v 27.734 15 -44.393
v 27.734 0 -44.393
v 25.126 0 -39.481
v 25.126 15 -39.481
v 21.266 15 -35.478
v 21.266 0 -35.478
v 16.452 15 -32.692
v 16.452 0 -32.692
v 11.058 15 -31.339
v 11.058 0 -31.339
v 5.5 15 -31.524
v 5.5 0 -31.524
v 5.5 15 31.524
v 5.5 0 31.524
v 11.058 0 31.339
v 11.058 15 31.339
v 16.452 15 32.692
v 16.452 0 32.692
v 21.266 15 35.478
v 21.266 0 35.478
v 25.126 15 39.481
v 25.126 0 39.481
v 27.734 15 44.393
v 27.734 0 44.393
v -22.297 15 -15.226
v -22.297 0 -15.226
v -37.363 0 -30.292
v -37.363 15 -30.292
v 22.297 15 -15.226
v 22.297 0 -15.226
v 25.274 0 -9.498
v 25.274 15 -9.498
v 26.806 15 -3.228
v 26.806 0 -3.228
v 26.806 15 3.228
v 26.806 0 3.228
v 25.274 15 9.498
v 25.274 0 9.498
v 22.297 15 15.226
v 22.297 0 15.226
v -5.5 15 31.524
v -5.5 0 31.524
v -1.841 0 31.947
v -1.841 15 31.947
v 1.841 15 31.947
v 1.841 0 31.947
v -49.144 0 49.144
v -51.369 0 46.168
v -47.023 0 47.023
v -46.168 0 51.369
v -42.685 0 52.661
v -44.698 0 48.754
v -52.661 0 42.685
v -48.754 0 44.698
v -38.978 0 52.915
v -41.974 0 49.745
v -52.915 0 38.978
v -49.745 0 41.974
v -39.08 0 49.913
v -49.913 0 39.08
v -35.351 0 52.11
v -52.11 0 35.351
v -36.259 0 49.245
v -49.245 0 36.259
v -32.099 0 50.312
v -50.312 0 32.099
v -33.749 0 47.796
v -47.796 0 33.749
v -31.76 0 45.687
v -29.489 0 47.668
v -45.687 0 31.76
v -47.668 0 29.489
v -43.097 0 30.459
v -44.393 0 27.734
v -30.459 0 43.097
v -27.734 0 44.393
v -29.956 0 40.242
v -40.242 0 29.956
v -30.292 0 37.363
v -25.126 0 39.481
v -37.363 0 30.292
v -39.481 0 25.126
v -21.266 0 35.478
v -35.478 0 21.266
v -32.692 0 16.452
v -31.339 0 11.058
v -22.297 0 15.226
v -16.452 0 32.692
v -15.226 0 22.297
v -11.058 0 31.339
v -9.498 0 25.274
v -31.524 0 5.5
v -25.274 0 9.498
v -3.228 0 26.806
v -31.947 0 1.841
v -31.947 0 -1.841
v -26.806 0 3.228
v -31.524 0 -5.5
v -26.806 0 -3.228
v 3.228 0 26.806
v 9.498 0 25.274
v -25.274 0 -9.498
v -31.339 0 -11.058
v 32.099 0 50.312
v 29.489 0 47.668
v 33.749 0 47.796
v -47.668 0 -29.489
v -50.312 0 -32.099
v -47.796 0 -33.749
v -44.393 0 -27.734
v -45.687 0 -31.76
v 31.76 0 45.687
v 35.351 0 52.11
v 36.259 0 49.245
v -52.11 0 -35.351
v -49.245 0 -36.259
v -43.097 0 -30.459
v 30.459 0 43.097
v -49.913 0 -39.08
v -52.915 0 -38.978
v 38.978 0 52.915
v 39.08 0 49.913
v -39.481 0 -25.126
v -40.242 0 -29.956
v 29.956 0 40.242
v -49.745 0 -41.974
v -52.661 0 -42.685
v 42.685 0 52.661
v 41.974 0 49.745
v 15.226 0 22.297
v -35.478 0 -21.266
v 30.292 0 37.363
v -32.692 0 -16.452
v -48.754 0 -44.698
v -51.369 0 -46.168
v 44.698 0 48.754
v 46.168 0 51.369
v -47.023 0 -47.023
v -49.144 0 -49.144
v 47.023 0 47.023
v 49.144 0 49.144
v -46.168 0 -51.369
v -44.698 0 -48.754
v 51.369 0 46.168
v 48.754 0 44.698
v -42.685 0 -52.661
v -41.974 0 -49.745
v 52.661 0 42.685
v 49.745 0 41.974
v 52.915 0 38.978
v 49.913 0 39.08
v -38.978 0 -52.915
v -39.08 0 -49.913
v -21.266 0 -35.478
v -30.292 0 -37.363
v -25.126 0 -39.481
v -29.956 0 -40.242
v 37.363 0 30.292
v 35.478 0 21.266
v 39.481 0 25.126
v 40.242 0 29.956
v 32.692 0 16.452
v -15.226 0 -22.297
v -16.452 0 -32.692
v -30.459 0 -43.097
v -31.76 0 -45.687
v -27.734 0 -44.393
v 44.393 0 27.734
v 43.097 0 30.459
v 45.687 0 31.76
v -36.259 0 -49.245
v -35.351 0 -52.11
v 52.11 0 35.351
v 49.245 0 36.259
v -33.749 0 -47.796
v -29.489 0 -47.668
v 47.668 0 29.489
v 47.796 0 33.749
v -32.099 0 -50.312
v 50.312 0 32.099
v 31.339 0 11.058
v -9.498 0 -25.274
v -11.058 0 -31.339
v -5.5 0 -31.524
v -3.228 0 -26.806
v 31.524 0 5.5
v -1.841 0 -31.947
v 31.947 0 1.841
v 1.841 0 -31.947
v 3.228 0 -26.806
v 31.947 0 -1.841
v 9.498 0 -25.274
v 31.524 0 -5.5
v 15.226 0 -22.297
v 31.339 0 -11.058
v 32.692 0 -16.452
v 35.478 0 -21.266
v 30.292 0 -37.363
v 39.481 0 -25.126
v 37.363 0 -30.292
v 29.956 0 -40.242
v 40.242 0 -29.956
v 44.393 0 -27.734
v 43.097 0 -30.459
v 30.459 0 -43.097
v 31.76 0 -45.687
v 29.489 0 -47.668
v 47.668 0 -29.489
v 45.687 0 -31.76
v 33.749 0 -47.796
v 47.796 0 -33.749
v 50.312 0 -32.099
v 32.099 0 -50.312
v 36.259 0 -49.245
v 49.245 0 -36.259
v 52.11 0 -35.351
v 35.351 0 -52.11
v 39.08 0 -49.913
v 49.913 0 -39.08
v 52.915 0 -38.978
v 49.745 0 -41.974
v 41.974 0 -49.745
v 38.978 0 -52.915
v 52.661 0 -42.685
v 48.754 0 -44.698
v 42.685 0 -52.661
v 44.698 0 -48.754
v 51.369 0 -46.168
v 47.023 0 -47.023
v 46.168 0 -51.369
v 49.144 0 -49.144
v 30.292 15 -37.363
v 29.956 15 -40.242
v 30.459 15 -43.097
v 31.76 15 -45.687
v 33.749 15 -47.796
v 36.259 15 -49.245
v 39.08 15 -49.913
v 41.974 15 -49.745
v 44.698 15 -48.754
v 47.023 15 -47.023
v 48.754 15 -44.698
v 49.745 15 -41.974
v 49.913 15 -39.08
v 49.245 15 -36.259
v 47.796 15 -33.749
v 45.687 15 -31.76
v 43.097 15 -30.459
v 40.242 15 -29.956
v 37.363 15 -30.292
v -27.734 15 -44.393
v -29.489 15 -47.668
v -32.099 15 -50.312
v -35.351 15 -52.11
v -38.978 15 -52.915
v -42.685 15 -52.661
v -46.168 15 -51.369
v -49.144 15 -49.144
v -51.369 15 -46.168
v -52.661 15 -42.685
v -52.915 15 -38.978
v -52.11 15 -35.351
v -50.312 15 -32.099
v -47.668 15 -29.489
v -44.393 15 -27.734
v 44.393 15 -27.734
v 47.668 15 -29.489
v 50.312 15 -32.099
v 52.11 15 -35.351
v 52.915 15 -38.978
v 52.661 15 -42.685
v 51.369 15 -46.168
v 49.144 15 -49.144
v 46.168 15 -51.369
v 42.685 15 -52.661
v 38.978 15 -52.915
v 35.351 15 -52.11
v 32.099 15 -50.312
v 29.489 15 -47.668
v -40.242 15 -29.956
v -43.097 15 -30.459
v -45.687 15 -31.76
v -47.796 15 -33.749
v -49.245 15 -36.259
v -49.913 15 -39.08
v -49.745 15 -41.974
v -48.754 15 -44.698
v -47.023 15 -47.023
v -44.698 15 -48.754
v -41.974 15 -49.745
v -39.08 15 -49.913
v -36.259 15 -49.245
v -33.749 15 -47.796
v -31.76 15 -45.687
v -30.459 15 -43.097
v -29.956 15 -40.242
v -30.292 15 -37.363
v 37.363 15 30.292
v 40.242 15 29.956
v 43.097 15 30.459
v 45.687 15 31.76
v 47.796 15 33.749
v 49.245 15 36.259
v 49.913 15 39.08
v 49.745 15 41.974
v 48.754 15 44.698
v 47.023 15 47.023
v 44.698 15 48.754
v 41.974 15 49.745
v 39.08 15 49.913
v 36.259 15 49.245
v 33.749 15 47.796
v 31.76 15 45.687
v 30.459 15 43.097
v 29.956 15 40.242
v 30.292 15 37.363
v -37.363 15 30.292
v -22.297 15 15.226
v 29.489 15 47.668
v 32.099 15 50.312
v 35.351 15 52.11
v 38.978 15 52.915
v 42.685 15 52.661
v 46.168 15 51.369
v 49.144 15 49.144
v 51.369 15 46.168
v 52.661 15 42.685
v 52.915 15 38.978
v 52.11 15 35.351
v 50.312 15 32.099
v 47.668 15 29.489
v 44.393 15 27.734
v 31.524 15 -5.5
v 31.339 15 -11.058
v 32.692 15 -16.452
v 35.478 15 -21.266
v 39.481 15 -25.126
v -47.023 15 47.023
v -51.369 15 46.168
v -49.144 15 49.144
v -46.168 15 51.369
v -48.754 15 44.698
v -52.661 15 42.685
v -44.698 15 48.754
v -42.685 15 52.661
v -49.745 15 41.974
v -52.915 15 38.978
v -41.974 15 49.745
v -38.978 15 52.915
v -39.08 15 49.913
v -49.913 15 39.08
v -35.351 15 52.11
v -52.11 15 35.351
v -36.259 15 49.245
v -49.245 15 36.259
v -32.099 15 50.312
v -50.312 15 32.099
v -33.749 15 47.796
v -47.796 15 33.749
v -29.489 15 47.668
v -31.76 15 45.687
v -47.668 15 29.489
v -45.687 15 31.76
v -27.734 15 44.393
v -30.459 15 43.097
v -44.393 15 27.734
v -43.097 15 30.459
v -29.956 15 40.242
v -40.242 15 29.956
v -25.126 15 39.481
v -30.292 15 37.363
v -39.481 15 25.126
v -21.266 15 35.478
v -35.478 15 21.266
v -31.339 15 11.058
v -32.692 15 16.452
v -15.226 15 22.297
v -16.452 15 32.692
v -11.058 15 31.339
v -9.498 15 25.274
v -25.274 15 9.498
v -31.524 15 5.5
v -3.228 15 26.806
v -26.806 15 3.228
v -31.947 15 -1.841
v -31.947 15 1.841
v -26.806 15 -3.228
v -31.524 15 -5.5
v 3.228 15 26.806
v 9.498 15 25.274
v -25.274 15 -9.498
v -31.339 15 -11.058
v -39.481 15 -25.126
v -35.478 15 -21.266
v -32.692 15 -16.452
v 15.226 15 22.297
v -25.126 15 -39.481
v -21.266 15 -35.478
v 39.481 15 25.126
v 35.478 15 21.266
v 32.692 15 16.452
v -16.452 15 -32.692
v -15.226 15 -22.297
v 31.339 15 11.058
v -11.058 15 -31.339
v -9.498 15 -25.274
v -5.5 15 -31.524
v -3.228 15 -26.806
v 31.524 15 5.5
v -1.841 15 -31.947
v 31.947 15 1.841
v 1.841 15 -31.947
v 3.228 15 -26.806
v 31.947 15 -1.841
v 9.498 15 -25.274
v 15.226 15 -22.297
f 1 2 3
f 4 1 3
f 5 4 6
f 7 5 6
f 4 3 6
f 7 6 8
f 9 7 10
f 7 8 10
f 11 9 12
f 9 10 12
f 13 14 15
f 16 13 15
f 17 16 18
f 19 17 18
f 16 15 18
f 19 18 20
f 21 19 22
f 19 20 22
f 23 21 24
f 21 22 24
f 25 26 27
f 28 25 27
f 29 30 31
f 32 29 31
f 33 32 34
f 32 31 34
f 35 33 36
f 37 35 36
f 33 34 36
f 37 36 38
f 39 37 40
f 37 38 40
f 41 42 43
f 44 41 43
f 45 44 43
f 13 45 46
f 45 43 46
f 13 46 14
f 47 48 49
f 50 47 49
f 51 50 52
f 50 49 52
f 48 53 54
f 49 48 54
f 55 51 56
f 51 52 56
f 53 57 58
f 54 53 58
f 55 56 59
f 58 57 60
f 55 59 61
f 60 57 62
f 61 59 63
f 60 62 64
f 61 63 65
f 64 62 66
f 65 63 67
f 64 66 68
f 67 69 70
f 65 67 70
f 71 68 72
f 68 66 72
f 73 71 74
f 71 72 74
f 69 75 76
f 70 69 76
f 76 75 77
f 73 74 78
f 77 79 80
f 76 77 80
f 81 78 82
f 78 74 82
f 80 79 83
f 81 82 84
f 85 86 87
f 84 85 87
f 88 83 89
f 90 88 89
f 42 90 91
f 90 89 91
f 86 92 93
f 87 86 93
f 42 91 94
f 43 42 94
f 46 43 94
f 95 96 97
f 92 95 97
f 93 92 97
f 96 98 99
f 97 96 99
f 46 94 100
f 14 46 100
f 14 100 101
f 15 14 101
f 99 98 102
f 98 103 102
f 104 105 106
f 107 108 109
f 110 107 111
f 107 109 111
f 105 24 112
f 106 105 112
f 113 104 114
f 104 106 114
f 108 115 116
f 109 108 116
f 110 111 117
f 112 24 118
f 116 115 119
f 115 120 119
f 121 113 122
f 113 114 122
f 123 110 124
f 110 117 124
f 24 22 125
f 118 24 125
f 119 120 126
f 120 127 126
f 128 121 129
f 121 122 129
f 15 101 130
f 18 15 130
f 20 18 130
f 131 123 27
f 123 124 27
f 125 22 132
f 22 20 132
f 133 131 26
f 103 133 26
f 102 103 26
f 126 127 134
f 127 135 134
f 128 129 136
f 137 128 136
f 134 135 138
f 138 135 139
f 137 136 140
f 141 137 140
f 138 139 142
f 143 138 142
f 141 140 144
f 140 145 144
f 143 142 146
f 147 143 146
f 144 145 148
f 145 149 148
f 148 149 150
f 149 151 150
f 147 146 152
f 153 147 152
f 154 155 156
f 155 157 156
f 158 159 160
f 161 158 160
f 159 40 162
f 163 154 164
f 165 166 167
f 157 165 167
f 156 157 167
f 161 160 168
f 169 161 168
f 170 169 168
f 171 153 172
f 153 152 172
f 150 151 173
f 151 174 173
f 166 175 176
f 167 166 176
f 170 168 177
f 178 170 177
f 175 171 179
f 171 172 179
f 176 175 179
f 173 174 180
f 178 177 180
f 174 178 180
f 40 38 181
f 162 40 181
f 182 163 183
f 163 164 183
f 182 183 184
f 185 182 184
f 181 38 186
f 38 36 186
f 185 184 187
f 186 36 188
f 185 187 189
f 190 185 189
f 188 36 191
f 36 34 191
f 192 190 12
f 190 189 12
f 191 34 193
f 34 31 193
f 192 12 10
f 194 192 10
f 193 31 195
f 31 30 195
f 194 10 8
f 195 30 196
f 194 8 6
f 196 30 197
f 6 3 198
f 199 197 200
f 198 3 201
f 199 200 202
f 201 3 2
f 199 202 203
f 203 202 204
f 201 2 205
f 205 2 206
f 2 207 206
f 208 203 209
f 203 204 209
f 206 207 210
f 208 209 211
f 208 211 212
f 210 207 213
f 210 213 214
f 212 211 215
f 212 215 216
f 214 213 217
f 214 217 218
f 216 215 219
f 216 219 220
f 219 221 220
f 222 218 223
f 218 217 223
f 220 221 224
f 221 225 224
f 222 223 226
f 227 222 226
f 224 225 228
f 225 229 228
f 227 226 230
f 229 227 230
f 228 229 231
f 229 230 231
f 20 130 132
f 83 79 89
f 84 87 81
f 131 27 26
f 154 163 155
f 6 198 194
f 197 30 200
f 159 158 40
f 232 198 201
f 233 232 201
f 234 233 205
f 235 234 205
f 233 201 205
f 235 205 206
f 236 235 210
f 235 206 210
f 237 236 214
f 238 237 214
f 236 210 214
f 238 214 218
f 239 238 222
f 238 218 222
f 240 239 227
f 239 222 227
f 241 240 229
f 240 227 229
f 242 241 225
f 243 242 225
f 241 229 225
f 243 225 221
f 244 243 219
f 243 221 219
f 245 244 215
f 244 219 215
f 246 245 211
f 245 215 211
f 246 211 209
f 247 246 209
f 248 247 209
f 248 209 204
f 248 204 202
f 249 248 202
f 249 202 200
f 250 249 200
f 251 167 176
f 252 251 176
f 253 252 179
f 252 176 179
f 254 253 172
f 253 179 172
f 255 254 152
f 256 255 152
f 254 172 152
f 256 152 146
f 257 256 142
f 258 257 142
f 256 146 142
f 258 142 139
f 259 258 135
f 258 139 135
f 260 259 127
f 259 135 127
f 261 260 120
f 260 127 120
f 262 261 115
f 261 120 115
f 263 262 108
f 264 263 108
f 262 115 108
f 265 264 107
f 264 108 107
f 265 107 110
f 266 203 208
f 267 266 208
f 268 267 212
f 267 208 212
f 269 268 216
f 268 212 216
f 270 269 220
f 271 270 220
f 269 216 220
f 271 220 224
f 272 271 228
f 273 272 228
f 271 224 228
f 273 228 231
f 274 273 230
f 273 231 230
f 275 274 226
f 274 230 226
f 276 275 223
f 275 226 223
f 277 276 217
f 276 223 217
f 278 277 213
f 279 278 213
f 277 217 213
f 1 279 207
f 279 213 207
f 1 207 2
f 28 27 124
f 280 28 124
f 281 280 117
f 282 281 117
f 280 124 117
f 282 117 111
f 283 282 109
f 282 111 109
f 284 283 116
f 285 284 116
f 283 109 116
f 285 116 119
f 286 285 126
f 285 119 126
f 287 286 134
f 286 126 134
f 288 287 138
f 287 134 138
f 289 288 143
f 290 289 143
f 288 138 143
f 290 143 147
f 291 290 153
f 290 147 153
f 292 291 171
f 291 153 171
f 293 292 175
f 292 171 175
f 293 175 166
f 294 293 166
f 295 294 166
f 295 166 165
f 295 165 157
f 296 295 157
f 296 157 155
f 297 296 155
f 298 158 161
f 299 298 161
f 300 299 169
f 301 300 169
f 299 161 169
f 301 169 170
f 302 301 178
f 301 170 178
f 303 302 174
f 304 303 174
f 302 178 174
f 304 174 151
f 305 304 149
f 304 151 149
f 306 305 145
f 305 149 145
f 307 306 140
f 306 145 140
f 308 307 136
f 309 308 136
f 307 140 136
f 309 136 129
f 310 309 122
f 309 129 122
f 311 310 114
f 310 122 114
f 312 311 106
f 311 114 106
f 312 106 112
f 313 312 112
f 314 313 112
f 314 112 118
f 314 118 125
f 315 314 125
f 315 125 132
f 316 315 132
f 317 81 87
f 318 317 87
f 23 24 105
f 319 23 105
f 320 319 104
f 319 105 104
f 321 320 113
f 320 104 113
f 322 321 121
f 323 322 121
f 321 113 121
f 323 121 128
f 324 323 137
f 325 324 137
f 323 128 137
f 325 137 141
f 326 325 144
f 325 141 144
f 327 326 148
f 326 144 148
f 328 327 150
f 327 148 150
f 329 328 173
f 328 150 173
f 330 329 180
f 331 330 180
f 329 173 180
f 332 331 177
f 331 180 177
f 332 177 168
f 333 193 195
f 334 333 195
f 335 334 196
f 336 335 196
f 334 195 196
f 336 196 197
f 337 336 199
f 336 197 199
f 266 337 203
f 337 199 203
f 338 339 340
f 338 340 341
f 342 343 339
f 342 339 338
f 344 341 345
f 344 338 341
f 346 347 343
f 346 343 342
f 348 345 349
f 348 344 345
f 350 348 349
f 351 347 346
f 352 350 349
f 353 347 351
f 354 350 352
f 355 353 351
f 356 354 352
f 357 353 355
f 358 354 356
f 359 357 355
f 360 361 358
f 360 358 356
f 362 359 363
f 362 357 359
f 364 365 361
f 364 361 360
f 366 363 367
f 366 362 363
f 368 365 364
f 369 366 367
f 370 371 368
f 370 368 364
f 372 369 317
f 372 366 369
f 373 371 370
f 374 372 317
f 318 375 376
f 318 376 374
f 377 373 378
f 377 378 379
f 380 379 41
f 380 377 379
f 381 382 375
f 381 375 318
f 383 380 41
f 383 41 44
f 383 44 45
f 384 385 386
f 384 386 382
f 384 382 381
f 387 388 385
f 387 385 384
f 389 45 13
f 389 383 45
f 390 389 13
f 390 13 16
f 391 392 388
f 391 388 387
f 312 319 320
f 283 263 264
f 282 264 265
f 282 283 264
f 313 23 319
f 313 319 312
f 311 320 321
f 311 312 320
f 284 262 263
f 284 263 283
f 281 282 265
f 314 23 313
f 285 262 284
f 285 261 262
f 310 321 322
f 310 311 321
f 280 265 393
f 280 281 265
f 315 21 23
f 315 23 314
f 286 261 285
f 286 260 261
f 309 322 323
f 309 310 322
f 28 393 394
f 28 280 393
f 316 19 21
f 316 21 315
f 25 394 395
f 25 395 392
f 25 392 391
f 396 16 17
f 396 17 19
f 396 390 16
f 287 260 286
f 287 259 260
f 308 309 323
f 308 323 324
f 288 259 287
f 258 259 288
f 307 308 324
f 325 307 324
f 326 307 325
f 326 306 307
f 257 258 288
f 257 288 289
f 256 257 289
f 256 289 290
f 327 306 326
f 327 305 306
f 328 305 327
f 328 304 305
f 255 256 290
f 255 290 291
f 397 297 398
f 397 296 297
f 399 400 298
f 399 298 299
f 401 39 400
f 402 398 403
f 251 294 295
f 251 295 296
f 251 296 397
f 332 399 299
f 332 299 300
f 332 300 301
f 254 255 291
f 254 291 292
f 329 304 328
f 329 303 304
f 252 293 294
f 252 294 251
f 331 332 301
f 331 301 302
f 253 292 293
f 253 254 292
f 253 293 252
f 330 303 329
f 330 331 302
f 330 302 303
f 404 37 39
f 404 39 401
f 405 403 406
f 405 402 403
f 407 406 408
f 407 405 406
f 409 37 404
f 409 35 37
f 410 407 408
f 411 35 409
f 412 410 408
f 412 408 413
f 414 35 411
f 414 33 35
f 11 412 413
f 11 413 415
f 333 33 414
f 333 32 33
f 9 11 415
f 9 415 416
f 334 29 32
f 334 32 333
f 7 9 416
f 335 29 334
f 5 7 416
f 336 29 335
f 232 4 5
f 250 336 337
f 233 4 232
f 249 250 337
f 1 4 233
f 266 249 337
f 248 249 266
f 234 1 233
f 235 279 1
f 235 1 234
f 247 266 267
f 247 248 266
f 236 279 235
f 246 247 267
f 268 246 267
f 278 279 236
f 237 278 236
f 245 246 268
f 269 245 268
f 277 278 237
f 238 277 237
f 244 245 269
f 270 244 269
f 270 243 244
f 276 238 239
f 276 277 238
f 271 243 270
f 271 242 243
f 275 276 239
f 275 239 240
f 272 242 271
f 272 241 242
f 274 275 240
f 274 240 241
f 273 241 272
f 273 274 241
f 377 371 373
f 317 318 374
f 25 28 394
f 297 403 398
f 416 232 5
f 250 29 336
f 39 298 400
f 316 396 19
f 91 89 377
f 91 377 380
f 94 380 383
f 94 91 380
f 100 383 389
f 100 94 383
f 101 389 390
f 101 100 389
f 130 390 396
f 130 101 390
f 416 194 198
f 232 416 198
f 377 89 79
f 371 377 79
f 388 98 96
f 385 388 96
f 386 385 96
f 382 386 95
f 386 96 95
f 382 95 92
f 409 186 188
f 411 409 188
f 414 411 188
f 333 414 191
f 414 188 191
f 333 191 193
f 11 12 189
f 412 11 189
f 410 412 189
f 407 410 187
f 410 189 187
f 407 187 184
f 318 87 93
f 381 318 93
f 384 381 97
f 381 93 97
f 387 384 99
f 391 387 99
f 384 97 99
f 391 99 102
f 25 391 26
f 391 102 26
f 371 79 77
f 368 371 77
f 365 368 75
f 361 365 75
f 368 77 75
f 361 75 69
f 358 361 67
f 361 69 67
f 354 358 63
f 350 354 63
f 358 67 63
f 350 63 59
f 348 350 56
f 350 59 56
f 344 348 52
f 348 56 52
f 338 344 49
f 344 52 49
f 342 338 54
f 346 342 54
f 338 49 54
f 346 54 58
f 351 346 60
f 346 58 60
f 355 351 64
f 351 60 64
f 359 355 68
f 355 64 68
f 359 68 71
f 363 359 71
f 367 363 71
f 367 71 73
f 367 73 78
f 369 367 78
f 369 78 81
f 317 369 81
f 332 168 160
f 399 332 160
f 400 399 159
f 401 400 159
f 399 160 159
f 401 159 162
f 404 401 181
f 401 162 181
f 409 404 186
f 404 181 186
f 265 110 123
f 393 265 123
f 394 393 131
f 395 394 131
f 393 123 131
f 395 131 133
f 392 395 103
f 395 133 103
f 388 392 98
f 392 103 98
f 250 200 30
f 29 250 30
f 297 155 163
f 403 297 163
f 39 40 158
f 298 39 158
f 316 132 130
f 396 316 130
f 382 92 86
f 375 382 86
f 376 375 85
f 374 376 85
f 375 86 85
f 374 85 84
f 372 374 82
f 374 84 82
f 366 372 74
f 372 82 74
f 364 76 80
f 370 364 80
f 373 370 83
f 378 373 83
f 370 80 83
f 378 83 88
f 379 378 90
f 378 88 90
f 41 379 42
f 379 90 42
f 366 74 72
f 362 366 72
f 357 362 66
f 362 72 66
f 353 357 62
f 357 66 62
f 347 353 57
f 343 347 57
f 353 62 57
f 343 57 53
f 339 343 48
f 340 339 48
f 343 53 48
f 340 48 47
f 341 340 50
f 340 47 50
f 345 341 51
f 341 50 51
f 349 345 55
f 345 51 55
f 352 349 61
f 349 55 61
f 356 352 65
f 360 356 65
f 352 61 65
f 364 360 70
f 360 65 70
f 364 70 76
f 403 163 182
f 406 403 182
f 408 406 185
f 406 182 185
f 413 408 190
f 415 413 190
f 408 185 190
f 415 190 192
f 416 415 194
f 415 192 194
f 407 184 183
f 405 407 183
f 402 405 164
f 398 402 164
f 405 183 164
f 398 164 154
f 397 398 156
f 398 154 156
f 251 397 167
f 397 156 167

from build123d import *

# Parameters (mm, degrees)
SKETCH1_R           = 27
BOSS_EXTRUDE1_DEPTH = 15
CUT_EXTRUDE1_START  = -15
CUT_EXTRUDE1_DEPTH  = 15


with BuildPart() as part:
    # Sketch1 → Boss-Extrude1 (new body)
    with BuildSketch(Plane(origin=(0, 0, 0), x_dir=(1, 0, 0), z_dir=(0, 1, 0))):
        with BuildLine():
            ThreePointArc((-31.523820357, 5.499886369), (-32, 0), (-31.523820357, -5.499886369))
            ThreePointArc((-31.523820357, -5.499886369), (-33.916662735, -18.956279365), (-44.393071751, -27.733810979))
            ThreePointArc((-44.393071751, -27.733810979), (-49.143921292, -49.143921292), (-27.733810979, -44.393071751))
            ThreePointArc((-27.733810979, -44.393071751), (-18.956279365, -33.916662735), (-5.499886369, -31.523820357))
            ThreePointArc((-5.499886369, -31.523820357), (0, -32), (5.499886369, -31.523820357))
            ThreePointArc((5.499886369, -31.523820357), (18.956279365, -33.916662735), (27.733810979, -44.393071751))
            ThreePointArc((27.733810979, -44.393071751), (49.143921292, -49.143921292), (44.393071751, -27.733810979))
            ThreePointArc((44.393071751, -27.733810979), (33.916662735, -18.956279365), (31.523820357, -5.499886369))
            ThreePointArc((31.523820357, -5.499886369), (32, 0), (31.523820357, 5.499886369))
            ThreePointArc((31.523820357, 5.499886369), (33.916662735, 18.956279365), (44.393071751, 27.733810979))
            ThreePointArc((44.393071751, 27.733810979), (49.143921292, 49.143921292), (27.733810979, 44.393071751))
            ThreePointArc((27.733810979, 44.393071751), (18.956279365, 33.916662735), (5.499886369, 31.523820357))
            ThreePointArc((5.499886369, 31.523820357), (0, 32), (-5.499886369, 31.523820357))
            ThreePointArc((-5.499886369, 31.523820357), (-18.956279365, 33.916662735), (-27.733810979, 44.393071751))
            ThreePointArc((-27.733810979, 44.393071751), (-49.143921292, 49.143921292), (-44.393071751, 27.733810979))
            ThreePointArc((-44.393071751, 27.733810979), (-33.916662735, 18.956279365), (-31.523820357, 5.499886369))
        make_face()
        with Locations(Location((0, 0, 0), (0, 0, 270))):
            Circle(SKETCH1_R, mode=Mode.SUBTRACT)
    extrude(amount=BOSS_EXTRUDE1_DEPTH)

    # Sketch2 → Cut-Extrude1 (cut)
    with BuildSketch(Plane(origin=(0, 15, 0), x_dir=(1, 0, 0), z_dir=(0, 1, 0)).offset(CUT_EXTRUDE1_START)):
        with BuildLine():
            Line((15.226129133, 22.297196945), (30.292274874, 37.363342686))
            ThreePointArc((30.292274874, 37.363342686), (47.022600949, 47.022600949), (37.363342686, 30.292274874))
            Line((37.363342686, 30.292274874), (22.297196945, 15.226129133))
            ThreePointArc((22.297196945, 15.226129133), (27, 0), (22.297196945, -15.226129133))
            Line((22.297196945, -15.226129133), (37.363342686, -30.292274874))
            ThreePointArc((37.363342686, -30.292274874), (47.022600949, -47.022600949), (30.292274874, -37.363342686))
            Line((30.292274874, -37.363342686), (15.226129133, -22.297196945))
            ThreePointArc((15.226129133, -22.297196945), (0, -27), (-15.226129133, -22.297196945))
            Line((-15.226129133, -22.297196945), (-30.292274874, -37.363342686))
            ThreePointArc((-30.292274874, -37.363342686), (-47.022600949, -47.022600949), (-37.363342686, -30.292274874))
            Line((-37.363342686, -30.292274874), (-22.297196945, -15.226129133))
            ThreePointArc((-22.297196945, -15.226129133), (-27, 0), (-22.297196945, 15.226129133))
            Line((-22.297196945, 15.226129133), (-37.363342686, 30.292274874))
            ThreePointArc((-37.363342686, 30.292274874), (-47.022600949, 47.022600949), (-30.292274874, 37.363342686))
            Line((-30.292274874, 37.363342686), (-15.226129133, 22.297196945))
            ThreePointArc((-15.226129133, 22.297196945), (0, 27), (15.226129133, 22.297196945))
        make_face()
    extrude(amount=CUT_EXTRUDE1_DEPTH, mode=Mode.SUBTRACT)


solid = part.part
